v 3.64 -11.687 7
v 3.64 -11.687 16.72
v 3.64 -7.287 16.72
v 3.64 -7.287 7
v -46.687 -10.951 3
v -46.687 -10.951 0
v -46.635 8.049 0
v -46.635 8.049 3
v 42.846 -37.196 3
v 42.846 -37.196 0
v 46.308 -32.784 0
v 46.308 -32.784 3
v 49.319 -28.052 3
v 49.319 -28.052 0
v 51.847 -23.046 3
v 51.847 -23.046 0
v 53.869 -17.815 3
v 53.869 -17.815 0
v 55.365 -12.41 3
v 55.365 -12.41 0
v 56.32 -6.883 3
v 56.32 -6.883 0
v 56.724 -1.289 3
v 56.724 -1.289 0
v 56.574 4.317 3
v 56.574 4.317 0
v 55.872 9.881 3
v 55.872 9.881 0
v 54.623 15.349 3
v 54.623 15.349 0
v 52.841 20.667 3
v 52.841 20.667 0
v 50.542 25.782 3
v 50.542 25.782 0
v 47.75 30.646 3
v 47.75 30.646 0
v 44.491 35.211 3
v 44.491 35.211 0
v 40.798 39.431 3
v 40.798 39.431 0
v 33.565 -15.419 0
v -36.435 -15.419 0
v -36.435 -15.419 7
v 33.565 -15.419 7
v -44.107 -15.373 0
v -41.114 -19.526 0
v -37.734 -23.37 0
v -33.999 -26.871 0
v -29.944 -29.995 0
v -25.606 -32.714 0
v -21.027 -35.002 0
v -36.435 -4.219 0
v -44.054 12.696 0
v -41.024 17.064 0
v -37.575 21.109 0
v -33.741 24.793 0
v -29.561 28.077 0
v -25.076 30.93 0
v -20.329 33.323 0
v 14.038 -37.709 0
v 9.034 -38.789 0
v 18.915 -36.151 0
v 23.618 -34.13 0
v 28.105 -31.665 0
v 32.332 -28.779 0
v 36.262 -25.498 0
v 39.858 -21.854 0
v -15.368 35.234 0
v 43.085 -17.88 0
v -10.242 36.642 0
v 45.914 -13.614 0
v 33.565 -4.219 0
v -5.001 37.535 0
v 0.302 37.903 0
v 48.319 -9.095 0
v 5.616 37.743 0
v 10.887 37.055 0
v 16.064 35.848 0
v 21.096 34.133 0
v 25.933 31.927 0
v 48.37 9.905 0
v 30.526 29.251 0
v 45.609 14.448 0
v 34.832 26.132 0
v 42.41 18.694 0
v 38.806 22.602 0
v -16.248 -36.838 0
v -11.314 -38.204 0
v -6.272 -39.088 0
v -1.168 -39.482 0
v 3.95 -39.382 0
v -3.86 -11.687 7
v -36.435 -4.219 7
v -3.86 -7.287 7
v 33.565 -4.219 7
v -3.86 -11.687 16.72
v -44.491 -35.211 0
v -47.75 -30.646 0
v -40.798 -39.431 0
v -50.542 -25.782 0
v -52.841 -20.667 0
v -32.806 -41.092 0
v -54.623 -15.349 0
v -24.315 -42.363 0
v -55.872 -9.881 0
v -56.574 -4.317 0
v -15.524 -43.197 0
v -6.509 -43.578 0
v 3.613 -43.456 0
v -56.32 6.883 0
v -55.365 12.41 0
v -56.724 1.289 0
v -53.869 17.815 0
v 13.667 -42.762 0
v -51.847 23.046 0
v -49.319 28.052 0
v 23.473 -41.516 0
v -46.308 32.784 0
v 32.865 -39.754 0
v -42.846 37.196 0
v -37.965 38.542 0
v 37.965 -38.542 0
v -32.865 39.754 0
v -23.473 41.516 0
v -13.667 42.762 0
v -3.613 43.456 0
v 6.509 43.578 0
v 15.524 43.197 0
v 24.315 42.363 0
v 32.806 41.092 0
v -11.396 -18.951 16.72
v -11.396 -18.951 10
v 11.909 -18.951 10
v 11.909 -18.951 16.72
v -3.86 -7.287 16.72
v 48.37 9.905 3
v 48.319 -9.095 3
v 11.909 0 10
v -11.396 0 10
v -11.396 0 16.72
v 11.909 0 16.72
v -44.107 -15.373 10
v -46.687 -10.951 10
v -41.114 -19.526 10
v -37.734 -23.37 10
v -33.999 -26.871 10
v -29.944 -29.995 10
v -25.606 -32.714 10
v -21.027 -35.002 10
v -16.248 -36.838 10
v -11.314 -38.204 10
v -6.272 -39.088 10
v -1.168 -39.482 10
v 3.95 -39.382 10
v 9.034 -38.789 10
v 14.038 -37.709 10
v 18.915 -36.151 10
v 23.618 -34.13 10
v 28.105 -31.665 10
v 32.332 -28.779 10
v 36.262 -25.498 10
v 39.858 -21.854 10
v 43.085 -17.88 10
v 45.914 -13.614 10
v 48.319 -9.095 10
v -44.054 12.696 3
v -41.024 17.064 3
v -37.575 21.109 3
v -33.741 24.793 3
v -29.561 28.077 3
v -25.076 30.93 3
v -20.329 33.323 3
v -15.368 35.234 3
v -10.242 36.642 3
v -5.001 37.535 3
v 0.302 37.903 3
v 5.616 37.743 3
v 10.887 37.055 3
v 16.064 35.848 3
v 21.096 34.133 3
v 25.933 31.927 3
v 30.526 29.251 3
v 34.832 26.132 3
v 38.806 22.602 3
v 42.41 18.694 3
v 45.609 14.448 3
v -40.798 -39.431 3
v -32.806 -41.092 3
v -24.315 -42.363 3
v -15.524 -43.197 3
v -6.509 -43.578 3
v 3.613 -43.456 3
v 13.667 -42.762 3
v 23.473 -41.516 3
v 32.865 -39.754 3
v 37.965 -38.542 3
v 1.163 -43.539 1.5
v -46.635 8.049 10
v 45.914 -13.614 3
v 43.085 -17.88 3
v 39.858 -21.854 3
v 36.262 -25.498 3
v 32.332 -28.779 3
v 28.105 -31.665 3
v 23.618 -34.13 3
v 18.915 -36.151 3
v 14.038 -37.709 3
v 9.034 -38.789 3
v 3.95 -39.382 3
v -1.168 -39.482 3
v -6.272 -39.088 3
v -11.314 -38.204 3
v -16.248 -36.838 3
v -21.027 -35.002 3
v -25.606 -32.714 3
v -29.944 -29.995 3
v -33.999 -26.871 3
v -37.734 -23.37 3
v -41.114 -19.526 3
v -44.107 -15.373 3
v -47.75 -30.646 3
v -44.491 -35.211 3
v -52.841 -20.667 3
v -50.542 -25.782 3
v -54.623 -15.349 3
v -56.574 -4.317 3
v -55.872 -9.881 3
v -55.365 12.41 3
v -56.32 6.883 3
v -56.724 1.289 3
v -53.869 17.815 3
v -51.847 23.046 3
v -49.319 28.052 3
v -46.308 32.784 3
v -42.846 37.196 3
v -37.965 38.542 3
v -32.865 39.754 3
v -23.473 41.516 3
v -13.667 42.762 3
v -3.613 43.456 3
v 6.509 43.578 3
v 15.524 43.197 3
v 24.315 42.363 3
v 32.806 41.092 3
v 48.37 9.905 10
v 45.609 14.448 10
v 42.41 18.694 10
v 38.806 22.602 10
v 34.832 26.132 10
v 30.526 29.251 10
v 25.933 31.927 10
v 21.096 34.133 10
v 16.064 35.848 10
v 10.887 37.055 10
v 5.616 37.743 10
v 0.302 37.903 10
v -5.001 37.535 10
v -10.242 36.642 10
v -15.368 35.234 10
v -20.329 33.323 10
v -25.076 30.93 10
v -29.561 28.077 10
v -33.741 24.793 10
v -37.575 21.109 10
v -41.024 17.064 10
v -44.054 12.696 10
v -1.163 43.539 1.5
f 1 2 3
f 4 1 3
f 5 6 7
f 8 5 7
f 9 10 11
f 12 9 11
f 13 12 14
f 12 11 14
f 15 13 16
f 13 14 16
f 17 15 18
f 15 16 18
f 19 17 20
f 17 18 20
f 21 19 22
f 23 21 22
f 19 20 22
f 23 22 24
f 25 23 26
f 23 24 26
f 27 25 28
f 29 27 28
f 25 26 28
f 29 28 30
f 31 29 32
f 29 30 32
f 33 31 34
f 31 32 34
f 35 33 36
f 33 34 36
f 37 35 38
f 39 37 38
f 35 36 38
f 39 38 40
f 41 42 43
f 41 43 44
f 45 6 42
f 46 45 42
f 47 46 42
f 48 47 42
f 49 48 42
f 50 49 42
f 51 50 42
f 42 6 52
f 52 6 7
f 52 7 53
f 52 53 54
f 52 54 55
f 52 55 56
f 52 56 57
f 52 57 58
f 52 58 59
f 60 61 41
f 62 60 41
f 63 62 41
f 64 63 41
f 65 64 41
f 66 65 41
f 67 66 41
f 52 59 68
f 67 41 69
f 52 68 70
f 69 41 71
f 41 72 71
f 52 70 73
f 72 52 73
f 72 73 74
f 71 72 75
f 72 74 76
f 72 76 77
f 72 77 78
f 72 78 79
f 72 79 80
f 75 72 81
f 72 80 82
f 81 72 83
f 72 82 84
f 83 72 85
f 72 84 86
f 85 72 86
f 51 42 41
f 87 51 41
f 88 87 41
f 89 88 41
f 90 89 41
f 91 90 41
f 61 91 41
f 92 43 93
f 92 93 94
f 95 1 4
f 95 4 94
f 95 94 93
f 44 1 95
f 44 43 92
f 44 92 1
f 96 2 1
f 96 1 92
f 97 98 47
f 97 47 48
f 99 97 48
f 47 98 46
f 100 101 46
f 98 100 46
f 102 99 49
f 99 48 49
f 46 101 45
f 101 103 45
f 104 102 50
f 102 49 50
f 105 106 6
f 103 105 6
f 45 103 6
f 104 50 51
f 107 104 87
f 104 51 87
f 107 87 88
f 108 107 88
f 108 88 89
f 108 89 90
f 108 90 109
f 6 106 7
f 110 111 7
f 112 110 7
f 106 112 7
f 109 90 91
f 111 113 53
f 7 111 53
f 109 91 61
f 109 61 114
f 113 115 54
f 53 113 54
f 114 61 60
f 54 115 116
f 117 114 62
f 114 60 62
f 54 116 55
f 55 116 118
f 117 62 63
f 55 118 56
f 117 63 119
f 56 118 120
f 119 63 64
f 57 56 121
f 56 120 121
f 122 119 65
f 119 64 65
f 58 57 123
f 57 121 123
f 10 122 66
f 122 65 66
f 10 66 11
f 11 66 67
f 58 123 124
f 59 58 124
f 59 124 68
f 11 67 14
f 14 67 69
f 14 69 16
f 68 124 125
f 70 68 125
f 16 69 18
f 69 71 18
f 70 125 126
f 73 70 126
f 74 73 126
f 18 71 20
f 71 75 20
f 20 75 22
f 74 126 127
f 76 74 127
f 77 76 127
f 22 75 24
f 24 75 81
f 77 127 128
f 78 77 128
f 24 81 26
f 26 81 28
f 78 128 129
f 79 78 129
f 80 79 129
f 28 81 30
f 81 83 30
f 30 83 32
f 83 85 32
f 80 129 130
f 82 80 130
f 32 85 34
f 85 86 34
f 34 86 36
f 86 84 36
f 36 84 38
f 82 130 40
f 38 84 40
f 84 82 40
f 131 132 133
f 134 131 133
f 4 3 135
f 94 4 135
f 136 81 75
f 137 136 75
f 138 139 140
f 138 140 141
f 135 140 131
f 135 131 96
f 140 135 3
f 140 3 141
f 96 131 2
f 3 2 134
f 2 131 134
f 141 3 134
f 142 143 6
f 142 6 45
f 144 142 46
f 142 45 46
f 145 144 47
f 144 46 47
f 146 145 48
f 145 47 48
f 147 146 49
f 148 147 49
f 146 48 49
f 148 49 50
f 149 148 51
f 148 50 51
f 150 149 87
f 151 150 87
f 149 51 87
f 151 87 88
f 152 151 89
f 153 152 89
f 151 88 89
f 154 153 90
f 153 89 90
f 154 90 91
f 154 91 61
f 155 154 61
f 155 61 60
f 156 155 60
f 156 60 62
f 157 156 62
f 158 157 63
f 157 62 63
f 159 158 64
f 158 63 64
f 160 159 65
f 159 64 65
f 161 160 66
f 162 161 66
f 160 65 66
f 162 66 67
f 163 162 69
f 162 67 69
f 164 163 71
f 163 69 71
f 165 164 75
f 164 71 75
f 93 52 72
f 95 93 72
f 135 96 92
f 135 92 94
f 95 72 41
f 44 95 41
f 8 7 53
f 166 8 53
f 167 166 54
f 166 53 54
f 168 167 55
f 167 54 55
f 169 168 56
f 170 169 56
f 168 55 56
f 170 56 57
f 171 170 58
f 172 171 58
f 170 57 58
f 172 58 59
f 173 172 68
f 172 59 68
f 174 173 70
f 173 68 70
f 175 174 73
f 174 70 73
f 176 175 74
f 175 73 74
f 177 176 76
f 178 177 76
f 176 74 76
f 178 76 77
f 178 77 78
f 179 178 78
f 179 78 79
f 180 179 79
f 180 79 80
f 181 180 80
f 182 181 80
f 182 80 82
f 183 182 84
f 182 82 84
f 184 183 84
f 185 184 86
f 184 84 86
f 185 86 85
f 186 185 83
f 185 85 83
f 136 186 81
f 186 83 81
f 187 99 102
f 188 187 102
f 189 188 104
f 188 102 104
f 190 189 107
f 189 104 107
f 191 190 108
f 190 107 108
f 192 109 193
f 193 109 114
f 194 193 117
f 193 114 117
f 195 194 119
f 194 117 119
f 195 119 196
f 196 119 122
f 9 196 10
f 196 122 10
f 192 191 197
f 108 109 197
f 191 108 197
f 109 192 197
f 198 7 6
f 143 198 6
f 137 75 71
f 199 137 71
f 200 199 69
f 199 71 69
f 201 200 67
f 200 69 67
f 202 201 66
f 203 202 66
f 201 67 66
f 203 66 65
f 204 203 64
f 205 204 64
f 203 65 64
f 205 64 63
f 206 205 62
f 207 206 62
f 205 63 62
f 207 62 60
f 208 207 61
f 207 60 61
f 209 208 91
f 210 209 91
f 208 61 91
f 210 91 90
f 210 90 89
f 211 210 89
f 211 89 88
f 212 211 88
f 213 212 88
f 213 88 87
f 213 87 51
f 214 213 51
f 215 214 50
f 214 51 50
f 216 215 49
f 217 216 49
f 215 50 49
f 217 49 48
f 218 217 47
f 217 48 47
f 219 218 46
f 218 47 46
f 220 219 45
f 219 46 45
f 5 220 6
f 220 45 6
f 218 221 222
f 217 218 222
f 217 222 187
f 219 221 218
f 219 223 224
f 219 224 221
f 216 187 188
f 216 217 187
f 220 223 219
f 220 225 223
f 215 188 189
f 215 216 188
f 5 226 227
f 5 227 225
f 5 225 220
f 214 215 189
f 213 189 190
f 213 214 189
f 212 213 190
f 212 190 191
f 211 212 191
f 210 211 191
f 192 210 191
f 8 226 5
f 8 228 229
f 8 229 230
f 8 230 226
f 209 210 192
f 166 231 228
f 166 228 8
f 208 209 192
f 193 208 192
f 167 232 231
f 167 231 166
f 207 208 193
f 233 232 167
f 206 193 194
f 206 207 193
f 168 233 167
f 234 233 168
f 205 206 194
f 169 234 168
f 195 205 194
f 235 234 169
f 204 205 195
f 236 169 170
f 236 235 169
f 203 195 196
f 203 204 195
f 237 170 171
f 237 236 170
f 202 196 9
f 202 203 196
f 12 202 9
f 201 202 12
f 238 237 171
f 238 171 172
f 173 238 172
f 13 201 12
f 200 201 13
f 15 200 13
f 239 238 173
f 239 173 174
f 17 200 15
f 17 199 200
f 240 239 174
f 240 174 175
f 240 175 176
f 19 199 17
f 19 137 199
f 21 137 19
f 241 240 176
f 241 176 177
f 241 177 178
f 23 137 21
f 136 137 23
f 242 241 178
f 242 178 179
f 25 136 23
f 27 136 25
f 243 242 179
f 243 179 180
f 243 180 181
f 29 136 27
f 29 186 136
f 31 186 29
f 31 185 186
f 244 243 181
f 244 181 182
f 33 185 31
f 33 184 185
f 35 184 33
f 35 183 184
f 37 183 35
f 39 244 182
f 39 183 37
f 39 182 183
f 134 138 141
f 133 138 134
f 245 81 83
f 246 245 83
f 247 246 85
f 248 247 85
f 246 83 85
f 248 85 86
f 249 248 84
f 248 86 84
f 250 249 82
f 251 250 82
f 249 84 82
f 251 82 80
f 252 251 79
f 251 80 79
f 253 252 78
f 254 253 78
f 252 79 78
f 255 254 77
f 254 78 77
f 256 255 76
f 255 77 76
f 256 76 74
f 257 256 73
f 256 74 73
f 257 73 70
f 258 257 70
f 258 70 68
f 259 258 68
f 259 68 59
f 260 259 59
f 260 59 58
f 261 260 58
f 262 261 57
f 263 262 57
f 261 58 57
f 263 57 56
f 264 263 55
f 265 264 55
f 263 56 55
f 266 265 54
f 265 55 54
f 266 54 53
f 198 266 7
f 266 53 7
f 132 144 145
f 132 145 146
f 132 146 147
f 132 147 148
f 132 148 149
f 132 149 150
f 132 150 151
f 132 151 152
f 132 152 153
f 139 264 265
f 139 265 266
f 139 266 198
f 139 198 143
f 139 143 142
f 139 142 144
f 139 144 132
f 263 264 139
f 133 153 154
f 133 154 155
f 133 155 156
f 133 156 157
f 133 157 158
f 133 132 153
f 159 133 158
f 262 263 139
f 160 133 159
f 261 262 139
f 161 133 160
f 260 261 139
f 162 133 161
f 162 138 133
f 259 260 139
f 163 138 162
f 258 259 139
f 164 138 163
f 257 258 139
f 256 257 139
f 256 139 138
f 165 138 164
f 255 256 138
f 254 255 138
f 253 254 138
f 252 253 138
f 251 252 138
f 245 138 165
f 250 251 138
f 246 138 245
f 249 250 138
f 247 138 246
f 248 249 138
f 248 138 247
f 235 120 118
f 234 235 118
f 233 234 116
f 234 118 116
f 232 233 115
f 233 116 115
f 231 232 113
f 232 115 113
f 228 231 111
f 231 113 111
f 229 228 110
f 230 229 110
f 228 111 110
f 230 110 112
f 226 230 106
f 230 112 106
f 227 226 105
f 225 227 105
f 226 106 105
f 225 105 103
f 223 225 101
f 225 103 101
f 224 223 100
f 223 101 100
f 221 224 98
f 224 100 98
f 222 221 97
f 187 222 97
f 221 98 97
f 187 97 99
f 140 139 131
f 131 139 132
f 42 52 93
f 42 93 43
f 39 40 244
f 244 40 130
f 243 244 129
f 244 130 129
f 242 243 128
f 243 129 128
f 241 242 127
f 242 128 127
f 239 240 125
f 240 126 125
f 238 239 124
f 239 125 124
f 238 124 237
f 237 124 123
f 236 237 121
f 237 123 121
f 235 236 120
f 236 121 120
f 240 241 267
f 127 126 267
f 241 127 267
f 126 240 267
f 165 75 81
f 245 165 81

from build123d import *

# Parameters (mm, degrees)
F1_DEPTH = 10
F2_DEPTH = 3
F3_W     = 70
F3_H     = 11.2
F4_DEPTH = 7
F5_W     = 23.3048796654
F5_H     = 18.9512204379
F5_W_2   = 7.5
F5_H_2   = 4.4
F6_DEPTH = 9.72
F7_DEPTH = 25


with BuildPart() as f1:
    # F0 (on Top) → F1 (new body)
    with BuildSketch(Plane.XY):
        with BuildLine():
            ThreePointArc((48.3699485287, 9.9050772031), (0.3020996759, 37.90300692), (-46.6353931233, 8.0487956344))
            Line((-46.6353931233, 8.0487956344), (-46.686543786, -10.9511355131))
            ThreePointArc((-46.686543786, -10.9511355131), (1.3919508256, -39.4939200459), (48.318797866, -9.0948539444))
            Line((48.318797866, -9.0948539444), (48.3699485287, 9.9050772031))
        make_face()
    extrude(amount=F1_DEPTH)

    # F3 (on face) → F4 (cut)
    with BuildSketch(Plane(origin=(0, 0, 0), x_dir=(1, 0, 0), z_dir=(0, 0, -1))):
        with Locations((-1.4346569404, 9.8187506333)):
            Rectangle(F3_W, F3_H)
    extrude(amount=-F4_DEPTH, mode=Mode.SUBTRACT)

    # F5 (on face) → F6 (join)
    with BuildSketch(Plane(origin=(0, 0, 7), x_dir=(1, 0, 0), z_dir=(0, 0, -1))):
        with Locations((0.2560969442, 9.4756102189)):
            Rectangle(F5_W, F5_H)
        with Locations((-0.1101304754, 9.4869323194)):
            Rectangle(F5_W_2, F5_H_2, mode=Mode.SUBTRACT)
    extrude(amount=-F6_DEPTH)

    # F7 (cut): a face of the model
    f7_faces = [f1.faces().sort_by_distance(p)[0] for p in [
        (-0.1101304754, -9.4869323194, 10),
    ]]
    extrude(f7_faces, amount=-F7_DEPTH, mode=Mode.SUBTRACT)


with BuildPart() as f2:
    # F0 (on Top) → F2 (new body)
    with BuildSketch(Plane.XY):
        with BuildLine():
            ThreePointArc((-42.845539618, 37.1958105908), (-56.7183506808, -1.5156802814), (-40.7978468614, -39.4310066082))
            add(Edge.make_bspline(
                [(-40.7978468614, -39.4310066082), (1.3221603939, -49.4766328995), (42.845539618, -37.1958105908)],
                knots=[4.2174235222, 4.2174235222, 4.2174235222, 5.2073544386, 5.2073544386, 5.2073544386], degree=2, weights=[1, 0.8799851178, 1]))
            ThreePointArc((42.845539618, -37.1958105908), (56.7183506808, 1.5156802814), (40.7978468614, 39.4310066082))
            add(Edge.make_bspline(
                [(40.7978468614, 39.4310066082), (-1.3221603939, 49.4766328995), (-42.845539618, 37.1958105908)],
                knots=[1.0758308686, 1.0758308686, 1.0758308686, 2.065761785, 2.065761785, 2.065761785], degree=2, weights=[1, 0.8799851178, 1]))
        make_face()
        with BuildLine():
            Line((-46.686543786, -10.9511355131), (-46.6353931233, 8.0487956344))
            ThreePointArc((-46.6353931233, 8.0487956344), (0.3020996759, 37.90300692), (48.3699485287, 9.9050772031))
            Line((48.3699485287, 9.9050772031), (48.318797866, -9.0948539444))
            ThreePointArc((48.318797866, -9.0948539444), (1.3919508256, -39.4939200459), (-46.686543786, -10.9511355131))
        make_face(mode=Mode.SUBTRACT)
    extrude(amount=F2_DEPTH)


solid = Compound([f1.part, f2.part])
